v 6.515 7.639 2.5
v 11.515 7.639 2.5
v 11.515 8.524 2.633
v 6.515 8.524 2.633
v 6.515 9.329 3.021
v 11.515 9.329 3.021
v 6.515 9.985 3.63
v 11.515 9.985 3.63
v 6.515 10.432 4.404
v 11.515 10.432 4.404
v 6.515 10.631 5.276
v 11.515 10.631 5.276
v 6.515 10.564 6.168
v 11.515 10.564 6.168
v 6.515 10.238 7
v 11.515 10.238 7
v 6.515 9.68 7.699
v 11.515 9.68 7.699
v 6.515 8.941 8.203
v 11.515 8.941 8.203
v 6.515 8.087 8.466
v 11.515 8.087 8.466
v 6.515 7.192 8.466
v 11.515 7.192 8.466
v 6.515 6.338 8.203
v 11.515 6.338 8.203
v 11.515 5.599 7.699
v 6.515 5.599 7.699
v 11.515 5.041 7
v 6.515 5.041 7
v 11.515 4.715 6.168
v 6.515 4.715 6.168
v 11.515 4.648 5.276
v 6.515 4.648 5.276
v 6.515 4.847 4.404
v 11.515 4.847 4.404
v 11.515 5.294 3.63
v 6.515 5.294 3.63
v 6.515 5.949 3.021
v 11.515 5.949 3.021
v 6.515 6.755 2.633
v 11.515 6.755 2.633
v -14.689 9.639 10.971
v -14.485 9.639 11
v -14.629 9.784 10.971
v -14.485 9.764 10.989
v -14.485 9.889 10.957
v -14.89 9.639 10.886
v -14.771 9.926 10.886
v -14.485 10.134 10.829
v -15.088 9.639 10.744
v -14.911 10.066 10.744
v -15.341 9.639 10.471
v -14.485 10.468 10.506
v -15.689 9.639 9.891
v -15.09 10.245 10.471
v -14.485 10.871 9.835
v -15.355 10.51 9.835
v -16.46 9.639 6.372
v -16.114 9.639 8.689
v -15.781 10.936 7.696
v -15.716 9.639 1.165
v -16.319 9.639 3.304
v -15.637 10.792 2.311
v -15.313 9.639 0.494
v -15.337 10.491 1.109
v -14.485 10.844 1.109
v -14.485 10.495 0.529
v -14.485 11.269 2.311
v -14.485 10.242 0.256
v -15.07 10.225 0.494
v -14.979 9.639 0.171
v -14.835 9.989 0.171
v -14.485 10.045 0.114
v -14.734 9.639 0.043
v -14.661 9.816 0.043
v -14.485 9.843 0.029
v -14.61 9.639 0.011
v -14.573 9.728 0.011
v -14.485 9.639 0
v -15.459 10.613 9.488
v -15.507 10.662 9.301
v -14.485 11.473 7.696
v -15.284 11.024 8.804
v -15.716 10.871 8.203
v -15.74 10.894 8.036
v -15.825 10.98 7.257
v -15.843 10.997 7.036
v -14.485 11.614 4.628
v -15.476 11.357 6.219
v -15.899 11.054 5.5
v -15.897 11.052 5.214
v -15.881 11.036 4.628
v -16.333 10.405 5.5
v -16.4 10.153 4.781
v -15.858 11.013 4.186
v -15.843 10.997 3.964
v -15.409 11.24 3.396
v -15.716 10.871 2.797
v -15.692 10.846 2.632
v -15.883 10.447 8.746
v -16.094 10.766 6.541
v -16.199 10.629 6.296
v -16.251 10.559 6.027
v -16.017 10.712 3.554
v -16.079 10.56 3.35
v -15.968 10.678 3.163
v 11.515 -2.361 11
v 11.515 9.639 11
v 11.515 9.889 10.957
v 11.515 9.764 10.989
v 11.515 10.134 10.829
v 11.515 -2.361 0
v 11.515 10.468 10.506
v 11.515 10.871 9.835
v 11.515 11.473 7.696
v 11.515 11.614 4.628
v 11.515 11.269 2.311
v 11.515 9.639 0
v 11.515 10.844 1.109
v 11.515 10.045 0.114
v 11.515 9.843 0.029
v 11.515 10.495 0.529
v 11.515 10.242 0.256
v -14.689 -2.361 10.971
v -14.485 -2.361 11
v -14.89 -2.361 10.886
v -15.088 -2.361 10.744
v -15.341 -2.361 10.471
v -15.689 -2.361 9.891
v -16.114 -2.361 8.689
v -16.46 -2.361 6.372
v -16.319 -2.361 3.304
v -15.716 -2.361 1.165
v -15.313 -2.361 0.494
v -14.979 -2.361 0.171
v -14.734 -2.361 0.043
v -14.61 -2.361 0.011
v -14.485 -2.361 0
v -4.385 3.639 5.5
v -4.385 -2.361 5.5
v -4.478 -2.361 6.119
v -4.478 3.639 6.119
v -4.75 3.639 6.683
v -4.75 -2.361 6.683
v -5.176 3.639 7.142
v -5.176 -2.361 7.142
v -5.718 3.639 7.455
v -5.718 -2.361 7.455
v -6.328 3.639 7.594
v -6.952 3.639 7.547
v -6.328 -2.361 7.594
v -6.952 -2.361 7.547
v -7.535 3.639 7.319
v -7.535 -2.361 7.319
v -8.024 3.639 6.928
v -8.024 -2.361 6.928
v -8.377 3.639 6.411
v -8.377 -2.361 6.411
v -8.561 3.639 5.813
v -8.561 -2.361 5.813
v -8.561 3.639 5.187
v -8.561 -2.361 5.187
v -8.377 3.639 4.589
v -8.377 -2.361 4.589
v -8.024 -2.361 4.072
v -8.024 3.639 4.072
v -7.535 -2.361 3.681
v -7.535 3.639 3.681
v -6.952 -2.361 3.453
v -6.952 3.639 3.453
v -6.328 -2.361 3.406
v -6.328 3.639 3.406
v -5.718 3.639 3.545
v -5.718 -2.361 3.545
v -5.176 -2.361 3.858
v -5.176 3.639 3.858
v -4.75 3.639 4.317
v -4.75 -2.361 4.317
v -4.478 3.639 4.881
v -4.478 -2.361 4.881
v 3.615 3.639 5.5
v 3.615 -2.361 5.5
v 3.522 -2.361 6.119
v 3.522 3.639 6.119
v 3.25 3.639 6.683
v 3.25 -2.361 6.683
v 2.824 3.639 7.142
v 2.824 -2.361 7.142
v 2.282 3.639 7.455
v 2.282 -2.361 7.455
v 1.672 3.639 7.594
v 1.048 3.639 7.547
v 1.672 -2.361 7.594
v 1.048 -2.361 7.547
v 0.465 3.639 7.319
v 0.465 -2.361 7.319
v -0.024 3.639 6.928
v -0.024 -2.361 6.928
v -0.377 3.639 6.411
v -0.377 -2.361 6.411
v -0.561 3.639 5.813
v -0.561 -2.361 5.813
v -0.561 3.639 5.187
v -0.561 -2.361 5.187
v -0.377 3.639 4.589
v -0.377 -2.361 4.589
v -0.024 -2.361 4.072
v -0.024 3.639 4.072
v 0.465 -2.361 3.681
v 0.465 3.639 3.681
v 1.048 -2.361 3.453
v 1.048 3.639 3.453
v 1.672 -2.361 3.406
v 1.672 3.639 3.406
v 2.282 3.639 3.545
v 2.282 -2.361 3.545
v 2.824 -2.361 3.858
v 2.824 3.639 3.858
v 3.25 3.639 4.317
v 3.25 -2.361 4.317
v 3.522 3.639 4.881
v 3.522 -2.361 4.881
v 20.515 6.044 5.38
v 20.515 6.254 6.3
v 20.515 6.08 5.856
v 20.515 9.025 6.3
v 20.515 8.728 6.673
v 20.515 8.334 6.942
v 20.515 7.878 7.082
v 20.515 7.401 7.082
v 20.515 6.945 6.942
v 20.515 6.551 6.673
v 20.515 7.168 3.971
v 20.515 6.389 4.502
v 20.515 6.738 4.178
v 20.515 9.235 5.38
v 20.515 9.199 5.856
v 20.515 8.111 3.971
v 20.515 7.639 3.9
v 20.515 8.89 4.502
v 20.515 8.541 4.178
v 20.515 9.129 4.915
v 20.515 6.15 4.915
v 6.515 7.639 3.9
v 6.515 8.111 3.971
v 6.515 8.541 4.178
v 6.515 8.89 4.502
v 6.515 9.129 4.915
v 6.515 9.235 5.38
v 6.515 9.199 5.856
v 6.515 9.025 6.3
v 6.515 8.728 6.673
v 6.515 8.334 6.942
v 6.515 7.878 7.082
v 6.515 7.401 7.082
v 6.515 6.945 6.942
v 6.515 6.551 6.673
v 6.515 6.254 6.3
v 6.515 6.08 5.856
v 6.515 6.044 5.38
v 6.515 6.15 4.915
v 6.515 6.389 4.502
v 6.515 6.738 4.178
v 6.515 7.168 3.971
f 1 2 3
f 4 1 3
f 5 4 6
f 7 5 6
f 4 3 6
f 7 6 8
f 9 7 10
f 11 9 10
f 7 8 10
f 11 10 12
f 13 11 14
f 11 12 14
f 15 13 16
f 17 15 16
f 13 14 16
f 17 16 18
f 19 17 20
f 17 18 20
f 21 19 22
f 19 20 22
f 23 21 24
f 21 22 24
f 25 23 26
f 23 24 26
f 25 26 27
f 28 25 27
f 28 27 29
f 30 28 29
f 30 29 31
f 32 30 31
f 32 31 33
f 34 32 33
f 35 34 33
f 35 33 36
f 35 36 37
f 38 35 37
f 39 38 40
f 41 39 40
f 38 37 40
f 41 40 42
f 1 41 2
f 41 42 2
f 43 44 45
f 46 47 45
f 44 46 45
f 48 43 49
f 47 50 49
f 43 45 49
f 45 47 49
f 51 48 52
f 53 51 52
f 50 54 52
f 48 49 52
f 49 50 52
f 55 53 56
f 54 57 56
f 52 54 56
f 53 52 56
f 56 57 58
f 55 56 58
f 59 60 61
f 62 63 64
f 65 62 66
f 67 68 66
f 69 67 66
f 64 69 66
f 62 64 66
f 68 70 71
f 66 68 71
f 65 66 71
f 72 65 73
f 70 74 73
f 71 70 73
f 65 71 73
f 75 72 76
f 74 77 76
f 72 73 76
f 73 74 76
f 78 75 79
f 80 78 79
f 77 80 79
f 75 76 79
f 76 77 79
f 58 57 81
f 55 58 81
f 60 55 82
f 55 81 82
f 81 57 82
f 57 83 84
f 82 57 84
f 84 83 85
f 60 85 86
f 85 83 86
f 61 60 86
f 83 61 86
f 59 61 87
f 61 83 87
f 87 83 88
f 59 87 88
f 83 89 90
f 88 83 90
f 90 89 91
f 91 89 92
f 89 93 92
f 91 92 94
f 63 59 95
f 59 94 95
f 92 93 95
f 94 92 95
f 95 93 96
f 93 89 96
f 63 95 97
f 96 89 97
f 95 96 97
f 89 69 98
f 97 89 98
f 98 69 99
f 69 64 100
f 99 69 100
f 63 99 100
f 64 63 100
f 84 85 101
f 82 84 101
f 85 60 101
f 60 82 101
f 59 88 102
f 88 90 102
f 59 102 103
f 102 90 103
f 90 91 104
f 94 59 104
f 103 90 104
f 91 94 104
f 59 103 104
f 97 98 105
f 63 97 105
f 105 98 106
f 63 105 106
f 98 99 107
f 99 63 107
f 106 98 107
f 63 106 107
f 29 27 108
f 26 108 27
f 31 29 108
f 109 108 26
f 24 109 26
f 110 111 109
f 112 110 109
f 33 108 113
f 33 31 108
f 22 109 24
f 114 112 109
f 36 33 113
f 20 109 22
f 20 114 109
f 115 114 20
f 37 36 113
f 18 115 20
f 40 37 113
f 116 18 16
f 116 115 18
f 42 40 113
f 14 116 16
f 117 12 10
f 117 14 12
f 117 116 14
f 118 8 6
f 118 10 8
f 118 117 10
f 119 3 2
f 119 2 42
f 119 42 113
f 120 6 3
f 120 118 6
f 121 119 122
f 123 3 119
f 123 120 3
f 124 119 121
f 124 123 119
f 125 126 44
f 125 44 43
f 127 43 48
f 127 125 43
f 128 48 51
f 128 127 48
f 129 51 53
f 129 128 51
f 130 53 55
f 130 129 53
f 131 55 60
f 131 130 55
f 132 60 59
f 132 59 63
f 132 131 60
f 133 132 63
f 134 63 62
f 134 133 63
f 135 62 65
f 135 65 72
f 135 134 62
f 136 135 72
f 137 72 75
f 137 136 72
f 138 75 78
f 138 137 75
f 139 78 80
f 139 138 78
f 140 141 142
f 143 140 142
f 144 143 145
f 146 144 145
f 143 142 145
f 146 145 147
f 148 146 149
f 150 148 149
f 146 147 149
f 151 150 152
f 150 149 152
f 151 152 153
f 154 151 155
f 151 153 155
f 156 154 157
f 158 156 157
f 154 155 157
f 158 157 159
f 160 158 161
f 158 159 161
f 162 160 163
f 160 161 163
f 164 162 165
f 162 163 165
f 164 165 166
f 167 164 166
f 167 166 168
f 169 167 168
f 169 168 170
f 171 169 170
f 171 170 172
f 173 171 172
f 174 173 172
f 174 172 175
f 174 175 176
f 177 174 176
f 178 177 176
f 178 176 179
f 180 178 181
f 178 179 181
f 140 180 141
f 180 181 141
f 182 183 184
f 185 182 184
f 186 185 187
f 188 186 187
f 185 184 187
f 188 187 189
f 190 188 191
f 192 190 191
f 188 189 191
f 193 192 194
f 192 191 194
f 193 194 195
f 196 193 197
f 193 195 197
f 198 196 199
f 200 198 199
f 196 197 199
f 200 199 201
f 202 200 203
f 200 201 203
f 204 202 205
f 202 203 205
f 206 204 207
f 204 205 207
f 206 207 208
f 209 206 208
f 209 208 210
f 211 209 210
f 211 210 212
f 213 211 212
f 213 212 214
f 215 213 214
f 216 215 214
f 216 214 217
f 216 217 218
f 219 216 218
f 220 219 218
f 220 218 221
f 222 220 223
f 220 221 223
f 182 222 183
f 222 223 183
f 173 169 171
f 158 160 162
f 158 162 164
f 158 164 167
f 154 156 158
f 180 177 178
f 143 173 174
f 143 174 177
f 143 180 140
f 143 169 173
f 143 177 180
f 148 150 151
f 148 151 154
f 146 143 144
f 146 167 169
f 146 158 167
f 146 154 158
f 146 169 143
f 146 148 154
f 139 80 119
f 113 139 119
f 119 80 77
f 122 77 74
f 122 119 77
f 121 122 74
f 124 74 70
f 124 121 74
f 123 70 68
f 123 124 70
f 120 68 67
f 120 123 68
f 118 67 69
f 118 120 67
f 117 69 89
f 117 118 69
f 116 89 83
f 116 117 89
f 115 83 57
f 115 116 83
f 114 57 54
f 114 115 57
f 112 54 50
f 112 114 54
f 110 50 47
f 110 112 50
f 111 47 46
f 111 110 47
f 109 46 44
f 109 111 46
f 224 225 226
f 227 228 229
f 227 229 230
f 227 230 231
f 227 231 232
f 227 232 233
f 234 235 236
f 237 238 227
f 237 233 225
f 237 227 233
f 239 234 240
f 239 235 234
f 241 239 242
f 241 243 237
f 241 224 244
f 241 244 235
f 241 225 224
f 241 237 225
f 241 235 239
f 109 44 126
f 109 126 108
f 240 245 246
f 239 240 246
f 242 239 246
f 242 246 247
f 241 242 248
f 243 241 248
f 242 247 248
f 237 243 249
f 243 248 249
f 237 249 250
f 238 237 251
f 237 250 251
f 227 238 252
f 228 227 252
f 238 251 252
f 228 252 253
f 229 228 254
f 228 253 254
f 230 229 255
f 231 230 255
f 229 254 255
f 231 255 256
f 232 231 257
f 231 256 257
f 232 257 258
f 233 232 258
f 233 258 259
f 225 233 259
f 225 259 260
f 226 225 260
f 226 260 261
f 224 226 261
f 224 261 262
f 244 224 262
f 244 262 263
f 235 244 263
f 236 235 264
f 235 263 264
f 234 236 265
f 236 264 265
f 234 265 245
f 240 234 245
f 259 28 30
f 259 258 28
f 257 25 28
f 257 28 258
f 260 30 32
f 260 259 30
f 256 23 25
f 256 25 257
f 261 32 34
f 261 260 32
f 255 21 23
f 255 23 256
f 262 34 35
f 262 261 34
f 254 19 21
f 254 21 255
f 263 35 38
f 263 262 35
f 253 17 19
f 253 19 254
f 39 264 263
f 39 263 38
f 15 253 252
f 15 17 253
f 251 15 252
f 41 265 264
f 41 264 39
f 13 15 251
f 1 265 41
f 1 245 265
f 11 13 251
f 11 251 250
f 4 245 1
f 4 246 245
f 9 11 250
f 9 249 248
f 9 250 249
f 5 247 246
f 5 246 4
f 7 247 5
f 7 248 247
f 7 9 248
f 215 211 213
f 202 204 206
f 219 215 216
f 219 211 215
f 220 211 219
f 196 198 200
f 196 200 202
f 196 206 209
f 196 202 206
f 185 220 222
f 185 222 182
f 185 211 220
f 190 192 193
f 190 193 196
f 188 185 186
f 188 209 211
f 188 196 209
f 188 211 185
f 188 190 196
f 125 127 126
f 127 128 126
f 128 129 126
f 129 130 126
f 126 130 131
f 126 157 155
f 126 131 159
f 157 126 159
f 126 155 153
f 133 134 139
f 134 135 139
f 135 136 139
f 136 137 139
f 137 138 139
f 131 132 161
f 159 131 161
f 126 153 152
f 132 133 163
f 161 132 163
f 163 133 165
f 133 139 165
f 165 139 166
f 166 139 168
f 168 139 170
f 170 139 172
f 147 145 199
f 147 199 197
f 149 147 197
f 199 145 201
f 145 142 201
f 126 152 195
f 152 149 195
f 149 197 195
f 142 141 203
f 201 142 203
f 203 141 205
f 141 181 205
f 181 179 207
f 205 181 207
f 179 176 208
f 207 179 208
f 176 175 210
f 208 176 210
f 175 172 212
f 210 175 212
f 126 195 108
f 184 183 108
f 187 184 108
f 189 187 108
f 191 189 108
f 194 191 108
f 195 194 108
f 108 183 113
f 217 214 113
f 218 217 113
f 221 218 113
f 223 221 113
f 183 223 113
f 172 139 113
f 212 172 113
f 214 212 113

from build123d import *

# Parameters (mm, degrees)
CROQUIS1_W              = 26
CROQUIS1_H              = 12
SALIENTE_EXTRUIR1_DEPTH = 11
CROQUIS5_RX             = 5.5
CROQUIS5_RY             = 2
SALIENTE_EXTRUIR2_DEPTH = 26
CROQUIS6_RX             = 5.5
CROQUIS6_RY             = 2
SALIENTE_EXTRUIR3_DEPTH = 12
REVOLUCI_N2_ANGLE       = 90
CROQUIS9_R              = 3
CORTAR_EXTRUIR1_DEPTH   = 5
CROQUIS11_R             = 1.6
SALIENTE_EXTRUIR4_DEPTH = 14
CROQUIS12_R             = 2.1
CORTAR_EXTRUIR2_DEPTH   = 6


with BuildPart() as part:
    # Croquis1 → Saliente-Extruir1 (new body)
    with BuildSketch(Plane.XY):
        with Locations((-1.484877735, 3.639455782)):
            Rectangle(CROQUIS1_W, CROQUIS1_H)
    extrude(amount=SALIENTE_EXTRUIR1_DEPTH)

    # Croquis5 → Saliente-Extruir2 (add)
    with BuildSketch(Plane(origin=(11.515122265, 0, 0), x_dir=(0, 0, -1), z_dir=(1, 0, 0))):
        with Locations((-5.5, 9.639455782)):
            Ellipse(CROQUIS5_RX, CROQUIS5_RY)
    extrude(amount=-SALIENTE_EXTRUIR2_DEPTH)

    # Croquis6 → Saliente-Extruir3 (add)
    with BuildSketch(Plane.XZ.offset(2.360544218)):
        with Locations(Location((-14.484877735, 5.5), (0, 0, -90))):
            Ellipse(CROQUIS6_RX, CROQUIS6_RY)
    extrude(amount=-SALIENTE_EXTRUIR3_DEPTH)

    # Croquis8 → Revolución2 (revolve)
    with BuildSketch(Plane.ZY.offset(14.484877735)):
        with BuildLine():
            Line((0, 9.639455782), (11, 9.639455782))
            add(Edge.make_bspline(
                [(11, 9.639455782), (11, 11.639455782), (5.5, 11.639455782), (0, 11.639455782), (0, 9.639455782)],
                knots=[3.141592654, 3.141592654, 3.141592654, 4.71238898, 4.71238898, 6.283185307, 6.283185307, 6.283185307], degree=2, weights=[1, 0.707106781, 1, 0.707106781, 1]))
        make_face()
    revolve(axis=Axis((-14.484877735, 9.639455782, 0), (0, 0, 1)), revolution_arc=REVOLUCI_N2_ANGLE)

    # Croquis9 → Cortar-Extruir1 (cut)
    with BuildSketch(Plane(origin=(11.515122265, 0, 0), x_dir=(0, 0, -1), z_dir=(1, 0, 0))):
        with Locations((-5.5, 7.639455782)):
            Circle(CROQUIS9_R)
    extrude(amount=-CORTAR_EXTRUIR1_DEPTH, mode=Mode.SUBTRACT)

    # Croquis11 → Saliente-Extruir4 (add)
    with BuildSketch(Plane(origin=(6.515122265, 0, 0), x_dir=(0, 0, -1), z_dir=(1, 0, 0))):
        with Locations((-5.5, 7.639455782)):
            Circle(CROQUIS11_R)
    extrude(amount=SALIENTE_EXTRUIR4_DEPTH)

    # Croquis12 → Cortar-Extruir2 (cut)
    with BuildSketch(Plane.XZ.offset(2.360544218)):
        with Locations((1.515122265, 5.5)):
            Circle(CROQUIS12_R)
        with Locations((-6.484877735, 5.5)):
            Circle(CROQUIS12_R)
    extrude(amount=-CORTAR_EXTRUIR2_DEPTH, mode=Mode.SUBTRACT)


solid = part.part
